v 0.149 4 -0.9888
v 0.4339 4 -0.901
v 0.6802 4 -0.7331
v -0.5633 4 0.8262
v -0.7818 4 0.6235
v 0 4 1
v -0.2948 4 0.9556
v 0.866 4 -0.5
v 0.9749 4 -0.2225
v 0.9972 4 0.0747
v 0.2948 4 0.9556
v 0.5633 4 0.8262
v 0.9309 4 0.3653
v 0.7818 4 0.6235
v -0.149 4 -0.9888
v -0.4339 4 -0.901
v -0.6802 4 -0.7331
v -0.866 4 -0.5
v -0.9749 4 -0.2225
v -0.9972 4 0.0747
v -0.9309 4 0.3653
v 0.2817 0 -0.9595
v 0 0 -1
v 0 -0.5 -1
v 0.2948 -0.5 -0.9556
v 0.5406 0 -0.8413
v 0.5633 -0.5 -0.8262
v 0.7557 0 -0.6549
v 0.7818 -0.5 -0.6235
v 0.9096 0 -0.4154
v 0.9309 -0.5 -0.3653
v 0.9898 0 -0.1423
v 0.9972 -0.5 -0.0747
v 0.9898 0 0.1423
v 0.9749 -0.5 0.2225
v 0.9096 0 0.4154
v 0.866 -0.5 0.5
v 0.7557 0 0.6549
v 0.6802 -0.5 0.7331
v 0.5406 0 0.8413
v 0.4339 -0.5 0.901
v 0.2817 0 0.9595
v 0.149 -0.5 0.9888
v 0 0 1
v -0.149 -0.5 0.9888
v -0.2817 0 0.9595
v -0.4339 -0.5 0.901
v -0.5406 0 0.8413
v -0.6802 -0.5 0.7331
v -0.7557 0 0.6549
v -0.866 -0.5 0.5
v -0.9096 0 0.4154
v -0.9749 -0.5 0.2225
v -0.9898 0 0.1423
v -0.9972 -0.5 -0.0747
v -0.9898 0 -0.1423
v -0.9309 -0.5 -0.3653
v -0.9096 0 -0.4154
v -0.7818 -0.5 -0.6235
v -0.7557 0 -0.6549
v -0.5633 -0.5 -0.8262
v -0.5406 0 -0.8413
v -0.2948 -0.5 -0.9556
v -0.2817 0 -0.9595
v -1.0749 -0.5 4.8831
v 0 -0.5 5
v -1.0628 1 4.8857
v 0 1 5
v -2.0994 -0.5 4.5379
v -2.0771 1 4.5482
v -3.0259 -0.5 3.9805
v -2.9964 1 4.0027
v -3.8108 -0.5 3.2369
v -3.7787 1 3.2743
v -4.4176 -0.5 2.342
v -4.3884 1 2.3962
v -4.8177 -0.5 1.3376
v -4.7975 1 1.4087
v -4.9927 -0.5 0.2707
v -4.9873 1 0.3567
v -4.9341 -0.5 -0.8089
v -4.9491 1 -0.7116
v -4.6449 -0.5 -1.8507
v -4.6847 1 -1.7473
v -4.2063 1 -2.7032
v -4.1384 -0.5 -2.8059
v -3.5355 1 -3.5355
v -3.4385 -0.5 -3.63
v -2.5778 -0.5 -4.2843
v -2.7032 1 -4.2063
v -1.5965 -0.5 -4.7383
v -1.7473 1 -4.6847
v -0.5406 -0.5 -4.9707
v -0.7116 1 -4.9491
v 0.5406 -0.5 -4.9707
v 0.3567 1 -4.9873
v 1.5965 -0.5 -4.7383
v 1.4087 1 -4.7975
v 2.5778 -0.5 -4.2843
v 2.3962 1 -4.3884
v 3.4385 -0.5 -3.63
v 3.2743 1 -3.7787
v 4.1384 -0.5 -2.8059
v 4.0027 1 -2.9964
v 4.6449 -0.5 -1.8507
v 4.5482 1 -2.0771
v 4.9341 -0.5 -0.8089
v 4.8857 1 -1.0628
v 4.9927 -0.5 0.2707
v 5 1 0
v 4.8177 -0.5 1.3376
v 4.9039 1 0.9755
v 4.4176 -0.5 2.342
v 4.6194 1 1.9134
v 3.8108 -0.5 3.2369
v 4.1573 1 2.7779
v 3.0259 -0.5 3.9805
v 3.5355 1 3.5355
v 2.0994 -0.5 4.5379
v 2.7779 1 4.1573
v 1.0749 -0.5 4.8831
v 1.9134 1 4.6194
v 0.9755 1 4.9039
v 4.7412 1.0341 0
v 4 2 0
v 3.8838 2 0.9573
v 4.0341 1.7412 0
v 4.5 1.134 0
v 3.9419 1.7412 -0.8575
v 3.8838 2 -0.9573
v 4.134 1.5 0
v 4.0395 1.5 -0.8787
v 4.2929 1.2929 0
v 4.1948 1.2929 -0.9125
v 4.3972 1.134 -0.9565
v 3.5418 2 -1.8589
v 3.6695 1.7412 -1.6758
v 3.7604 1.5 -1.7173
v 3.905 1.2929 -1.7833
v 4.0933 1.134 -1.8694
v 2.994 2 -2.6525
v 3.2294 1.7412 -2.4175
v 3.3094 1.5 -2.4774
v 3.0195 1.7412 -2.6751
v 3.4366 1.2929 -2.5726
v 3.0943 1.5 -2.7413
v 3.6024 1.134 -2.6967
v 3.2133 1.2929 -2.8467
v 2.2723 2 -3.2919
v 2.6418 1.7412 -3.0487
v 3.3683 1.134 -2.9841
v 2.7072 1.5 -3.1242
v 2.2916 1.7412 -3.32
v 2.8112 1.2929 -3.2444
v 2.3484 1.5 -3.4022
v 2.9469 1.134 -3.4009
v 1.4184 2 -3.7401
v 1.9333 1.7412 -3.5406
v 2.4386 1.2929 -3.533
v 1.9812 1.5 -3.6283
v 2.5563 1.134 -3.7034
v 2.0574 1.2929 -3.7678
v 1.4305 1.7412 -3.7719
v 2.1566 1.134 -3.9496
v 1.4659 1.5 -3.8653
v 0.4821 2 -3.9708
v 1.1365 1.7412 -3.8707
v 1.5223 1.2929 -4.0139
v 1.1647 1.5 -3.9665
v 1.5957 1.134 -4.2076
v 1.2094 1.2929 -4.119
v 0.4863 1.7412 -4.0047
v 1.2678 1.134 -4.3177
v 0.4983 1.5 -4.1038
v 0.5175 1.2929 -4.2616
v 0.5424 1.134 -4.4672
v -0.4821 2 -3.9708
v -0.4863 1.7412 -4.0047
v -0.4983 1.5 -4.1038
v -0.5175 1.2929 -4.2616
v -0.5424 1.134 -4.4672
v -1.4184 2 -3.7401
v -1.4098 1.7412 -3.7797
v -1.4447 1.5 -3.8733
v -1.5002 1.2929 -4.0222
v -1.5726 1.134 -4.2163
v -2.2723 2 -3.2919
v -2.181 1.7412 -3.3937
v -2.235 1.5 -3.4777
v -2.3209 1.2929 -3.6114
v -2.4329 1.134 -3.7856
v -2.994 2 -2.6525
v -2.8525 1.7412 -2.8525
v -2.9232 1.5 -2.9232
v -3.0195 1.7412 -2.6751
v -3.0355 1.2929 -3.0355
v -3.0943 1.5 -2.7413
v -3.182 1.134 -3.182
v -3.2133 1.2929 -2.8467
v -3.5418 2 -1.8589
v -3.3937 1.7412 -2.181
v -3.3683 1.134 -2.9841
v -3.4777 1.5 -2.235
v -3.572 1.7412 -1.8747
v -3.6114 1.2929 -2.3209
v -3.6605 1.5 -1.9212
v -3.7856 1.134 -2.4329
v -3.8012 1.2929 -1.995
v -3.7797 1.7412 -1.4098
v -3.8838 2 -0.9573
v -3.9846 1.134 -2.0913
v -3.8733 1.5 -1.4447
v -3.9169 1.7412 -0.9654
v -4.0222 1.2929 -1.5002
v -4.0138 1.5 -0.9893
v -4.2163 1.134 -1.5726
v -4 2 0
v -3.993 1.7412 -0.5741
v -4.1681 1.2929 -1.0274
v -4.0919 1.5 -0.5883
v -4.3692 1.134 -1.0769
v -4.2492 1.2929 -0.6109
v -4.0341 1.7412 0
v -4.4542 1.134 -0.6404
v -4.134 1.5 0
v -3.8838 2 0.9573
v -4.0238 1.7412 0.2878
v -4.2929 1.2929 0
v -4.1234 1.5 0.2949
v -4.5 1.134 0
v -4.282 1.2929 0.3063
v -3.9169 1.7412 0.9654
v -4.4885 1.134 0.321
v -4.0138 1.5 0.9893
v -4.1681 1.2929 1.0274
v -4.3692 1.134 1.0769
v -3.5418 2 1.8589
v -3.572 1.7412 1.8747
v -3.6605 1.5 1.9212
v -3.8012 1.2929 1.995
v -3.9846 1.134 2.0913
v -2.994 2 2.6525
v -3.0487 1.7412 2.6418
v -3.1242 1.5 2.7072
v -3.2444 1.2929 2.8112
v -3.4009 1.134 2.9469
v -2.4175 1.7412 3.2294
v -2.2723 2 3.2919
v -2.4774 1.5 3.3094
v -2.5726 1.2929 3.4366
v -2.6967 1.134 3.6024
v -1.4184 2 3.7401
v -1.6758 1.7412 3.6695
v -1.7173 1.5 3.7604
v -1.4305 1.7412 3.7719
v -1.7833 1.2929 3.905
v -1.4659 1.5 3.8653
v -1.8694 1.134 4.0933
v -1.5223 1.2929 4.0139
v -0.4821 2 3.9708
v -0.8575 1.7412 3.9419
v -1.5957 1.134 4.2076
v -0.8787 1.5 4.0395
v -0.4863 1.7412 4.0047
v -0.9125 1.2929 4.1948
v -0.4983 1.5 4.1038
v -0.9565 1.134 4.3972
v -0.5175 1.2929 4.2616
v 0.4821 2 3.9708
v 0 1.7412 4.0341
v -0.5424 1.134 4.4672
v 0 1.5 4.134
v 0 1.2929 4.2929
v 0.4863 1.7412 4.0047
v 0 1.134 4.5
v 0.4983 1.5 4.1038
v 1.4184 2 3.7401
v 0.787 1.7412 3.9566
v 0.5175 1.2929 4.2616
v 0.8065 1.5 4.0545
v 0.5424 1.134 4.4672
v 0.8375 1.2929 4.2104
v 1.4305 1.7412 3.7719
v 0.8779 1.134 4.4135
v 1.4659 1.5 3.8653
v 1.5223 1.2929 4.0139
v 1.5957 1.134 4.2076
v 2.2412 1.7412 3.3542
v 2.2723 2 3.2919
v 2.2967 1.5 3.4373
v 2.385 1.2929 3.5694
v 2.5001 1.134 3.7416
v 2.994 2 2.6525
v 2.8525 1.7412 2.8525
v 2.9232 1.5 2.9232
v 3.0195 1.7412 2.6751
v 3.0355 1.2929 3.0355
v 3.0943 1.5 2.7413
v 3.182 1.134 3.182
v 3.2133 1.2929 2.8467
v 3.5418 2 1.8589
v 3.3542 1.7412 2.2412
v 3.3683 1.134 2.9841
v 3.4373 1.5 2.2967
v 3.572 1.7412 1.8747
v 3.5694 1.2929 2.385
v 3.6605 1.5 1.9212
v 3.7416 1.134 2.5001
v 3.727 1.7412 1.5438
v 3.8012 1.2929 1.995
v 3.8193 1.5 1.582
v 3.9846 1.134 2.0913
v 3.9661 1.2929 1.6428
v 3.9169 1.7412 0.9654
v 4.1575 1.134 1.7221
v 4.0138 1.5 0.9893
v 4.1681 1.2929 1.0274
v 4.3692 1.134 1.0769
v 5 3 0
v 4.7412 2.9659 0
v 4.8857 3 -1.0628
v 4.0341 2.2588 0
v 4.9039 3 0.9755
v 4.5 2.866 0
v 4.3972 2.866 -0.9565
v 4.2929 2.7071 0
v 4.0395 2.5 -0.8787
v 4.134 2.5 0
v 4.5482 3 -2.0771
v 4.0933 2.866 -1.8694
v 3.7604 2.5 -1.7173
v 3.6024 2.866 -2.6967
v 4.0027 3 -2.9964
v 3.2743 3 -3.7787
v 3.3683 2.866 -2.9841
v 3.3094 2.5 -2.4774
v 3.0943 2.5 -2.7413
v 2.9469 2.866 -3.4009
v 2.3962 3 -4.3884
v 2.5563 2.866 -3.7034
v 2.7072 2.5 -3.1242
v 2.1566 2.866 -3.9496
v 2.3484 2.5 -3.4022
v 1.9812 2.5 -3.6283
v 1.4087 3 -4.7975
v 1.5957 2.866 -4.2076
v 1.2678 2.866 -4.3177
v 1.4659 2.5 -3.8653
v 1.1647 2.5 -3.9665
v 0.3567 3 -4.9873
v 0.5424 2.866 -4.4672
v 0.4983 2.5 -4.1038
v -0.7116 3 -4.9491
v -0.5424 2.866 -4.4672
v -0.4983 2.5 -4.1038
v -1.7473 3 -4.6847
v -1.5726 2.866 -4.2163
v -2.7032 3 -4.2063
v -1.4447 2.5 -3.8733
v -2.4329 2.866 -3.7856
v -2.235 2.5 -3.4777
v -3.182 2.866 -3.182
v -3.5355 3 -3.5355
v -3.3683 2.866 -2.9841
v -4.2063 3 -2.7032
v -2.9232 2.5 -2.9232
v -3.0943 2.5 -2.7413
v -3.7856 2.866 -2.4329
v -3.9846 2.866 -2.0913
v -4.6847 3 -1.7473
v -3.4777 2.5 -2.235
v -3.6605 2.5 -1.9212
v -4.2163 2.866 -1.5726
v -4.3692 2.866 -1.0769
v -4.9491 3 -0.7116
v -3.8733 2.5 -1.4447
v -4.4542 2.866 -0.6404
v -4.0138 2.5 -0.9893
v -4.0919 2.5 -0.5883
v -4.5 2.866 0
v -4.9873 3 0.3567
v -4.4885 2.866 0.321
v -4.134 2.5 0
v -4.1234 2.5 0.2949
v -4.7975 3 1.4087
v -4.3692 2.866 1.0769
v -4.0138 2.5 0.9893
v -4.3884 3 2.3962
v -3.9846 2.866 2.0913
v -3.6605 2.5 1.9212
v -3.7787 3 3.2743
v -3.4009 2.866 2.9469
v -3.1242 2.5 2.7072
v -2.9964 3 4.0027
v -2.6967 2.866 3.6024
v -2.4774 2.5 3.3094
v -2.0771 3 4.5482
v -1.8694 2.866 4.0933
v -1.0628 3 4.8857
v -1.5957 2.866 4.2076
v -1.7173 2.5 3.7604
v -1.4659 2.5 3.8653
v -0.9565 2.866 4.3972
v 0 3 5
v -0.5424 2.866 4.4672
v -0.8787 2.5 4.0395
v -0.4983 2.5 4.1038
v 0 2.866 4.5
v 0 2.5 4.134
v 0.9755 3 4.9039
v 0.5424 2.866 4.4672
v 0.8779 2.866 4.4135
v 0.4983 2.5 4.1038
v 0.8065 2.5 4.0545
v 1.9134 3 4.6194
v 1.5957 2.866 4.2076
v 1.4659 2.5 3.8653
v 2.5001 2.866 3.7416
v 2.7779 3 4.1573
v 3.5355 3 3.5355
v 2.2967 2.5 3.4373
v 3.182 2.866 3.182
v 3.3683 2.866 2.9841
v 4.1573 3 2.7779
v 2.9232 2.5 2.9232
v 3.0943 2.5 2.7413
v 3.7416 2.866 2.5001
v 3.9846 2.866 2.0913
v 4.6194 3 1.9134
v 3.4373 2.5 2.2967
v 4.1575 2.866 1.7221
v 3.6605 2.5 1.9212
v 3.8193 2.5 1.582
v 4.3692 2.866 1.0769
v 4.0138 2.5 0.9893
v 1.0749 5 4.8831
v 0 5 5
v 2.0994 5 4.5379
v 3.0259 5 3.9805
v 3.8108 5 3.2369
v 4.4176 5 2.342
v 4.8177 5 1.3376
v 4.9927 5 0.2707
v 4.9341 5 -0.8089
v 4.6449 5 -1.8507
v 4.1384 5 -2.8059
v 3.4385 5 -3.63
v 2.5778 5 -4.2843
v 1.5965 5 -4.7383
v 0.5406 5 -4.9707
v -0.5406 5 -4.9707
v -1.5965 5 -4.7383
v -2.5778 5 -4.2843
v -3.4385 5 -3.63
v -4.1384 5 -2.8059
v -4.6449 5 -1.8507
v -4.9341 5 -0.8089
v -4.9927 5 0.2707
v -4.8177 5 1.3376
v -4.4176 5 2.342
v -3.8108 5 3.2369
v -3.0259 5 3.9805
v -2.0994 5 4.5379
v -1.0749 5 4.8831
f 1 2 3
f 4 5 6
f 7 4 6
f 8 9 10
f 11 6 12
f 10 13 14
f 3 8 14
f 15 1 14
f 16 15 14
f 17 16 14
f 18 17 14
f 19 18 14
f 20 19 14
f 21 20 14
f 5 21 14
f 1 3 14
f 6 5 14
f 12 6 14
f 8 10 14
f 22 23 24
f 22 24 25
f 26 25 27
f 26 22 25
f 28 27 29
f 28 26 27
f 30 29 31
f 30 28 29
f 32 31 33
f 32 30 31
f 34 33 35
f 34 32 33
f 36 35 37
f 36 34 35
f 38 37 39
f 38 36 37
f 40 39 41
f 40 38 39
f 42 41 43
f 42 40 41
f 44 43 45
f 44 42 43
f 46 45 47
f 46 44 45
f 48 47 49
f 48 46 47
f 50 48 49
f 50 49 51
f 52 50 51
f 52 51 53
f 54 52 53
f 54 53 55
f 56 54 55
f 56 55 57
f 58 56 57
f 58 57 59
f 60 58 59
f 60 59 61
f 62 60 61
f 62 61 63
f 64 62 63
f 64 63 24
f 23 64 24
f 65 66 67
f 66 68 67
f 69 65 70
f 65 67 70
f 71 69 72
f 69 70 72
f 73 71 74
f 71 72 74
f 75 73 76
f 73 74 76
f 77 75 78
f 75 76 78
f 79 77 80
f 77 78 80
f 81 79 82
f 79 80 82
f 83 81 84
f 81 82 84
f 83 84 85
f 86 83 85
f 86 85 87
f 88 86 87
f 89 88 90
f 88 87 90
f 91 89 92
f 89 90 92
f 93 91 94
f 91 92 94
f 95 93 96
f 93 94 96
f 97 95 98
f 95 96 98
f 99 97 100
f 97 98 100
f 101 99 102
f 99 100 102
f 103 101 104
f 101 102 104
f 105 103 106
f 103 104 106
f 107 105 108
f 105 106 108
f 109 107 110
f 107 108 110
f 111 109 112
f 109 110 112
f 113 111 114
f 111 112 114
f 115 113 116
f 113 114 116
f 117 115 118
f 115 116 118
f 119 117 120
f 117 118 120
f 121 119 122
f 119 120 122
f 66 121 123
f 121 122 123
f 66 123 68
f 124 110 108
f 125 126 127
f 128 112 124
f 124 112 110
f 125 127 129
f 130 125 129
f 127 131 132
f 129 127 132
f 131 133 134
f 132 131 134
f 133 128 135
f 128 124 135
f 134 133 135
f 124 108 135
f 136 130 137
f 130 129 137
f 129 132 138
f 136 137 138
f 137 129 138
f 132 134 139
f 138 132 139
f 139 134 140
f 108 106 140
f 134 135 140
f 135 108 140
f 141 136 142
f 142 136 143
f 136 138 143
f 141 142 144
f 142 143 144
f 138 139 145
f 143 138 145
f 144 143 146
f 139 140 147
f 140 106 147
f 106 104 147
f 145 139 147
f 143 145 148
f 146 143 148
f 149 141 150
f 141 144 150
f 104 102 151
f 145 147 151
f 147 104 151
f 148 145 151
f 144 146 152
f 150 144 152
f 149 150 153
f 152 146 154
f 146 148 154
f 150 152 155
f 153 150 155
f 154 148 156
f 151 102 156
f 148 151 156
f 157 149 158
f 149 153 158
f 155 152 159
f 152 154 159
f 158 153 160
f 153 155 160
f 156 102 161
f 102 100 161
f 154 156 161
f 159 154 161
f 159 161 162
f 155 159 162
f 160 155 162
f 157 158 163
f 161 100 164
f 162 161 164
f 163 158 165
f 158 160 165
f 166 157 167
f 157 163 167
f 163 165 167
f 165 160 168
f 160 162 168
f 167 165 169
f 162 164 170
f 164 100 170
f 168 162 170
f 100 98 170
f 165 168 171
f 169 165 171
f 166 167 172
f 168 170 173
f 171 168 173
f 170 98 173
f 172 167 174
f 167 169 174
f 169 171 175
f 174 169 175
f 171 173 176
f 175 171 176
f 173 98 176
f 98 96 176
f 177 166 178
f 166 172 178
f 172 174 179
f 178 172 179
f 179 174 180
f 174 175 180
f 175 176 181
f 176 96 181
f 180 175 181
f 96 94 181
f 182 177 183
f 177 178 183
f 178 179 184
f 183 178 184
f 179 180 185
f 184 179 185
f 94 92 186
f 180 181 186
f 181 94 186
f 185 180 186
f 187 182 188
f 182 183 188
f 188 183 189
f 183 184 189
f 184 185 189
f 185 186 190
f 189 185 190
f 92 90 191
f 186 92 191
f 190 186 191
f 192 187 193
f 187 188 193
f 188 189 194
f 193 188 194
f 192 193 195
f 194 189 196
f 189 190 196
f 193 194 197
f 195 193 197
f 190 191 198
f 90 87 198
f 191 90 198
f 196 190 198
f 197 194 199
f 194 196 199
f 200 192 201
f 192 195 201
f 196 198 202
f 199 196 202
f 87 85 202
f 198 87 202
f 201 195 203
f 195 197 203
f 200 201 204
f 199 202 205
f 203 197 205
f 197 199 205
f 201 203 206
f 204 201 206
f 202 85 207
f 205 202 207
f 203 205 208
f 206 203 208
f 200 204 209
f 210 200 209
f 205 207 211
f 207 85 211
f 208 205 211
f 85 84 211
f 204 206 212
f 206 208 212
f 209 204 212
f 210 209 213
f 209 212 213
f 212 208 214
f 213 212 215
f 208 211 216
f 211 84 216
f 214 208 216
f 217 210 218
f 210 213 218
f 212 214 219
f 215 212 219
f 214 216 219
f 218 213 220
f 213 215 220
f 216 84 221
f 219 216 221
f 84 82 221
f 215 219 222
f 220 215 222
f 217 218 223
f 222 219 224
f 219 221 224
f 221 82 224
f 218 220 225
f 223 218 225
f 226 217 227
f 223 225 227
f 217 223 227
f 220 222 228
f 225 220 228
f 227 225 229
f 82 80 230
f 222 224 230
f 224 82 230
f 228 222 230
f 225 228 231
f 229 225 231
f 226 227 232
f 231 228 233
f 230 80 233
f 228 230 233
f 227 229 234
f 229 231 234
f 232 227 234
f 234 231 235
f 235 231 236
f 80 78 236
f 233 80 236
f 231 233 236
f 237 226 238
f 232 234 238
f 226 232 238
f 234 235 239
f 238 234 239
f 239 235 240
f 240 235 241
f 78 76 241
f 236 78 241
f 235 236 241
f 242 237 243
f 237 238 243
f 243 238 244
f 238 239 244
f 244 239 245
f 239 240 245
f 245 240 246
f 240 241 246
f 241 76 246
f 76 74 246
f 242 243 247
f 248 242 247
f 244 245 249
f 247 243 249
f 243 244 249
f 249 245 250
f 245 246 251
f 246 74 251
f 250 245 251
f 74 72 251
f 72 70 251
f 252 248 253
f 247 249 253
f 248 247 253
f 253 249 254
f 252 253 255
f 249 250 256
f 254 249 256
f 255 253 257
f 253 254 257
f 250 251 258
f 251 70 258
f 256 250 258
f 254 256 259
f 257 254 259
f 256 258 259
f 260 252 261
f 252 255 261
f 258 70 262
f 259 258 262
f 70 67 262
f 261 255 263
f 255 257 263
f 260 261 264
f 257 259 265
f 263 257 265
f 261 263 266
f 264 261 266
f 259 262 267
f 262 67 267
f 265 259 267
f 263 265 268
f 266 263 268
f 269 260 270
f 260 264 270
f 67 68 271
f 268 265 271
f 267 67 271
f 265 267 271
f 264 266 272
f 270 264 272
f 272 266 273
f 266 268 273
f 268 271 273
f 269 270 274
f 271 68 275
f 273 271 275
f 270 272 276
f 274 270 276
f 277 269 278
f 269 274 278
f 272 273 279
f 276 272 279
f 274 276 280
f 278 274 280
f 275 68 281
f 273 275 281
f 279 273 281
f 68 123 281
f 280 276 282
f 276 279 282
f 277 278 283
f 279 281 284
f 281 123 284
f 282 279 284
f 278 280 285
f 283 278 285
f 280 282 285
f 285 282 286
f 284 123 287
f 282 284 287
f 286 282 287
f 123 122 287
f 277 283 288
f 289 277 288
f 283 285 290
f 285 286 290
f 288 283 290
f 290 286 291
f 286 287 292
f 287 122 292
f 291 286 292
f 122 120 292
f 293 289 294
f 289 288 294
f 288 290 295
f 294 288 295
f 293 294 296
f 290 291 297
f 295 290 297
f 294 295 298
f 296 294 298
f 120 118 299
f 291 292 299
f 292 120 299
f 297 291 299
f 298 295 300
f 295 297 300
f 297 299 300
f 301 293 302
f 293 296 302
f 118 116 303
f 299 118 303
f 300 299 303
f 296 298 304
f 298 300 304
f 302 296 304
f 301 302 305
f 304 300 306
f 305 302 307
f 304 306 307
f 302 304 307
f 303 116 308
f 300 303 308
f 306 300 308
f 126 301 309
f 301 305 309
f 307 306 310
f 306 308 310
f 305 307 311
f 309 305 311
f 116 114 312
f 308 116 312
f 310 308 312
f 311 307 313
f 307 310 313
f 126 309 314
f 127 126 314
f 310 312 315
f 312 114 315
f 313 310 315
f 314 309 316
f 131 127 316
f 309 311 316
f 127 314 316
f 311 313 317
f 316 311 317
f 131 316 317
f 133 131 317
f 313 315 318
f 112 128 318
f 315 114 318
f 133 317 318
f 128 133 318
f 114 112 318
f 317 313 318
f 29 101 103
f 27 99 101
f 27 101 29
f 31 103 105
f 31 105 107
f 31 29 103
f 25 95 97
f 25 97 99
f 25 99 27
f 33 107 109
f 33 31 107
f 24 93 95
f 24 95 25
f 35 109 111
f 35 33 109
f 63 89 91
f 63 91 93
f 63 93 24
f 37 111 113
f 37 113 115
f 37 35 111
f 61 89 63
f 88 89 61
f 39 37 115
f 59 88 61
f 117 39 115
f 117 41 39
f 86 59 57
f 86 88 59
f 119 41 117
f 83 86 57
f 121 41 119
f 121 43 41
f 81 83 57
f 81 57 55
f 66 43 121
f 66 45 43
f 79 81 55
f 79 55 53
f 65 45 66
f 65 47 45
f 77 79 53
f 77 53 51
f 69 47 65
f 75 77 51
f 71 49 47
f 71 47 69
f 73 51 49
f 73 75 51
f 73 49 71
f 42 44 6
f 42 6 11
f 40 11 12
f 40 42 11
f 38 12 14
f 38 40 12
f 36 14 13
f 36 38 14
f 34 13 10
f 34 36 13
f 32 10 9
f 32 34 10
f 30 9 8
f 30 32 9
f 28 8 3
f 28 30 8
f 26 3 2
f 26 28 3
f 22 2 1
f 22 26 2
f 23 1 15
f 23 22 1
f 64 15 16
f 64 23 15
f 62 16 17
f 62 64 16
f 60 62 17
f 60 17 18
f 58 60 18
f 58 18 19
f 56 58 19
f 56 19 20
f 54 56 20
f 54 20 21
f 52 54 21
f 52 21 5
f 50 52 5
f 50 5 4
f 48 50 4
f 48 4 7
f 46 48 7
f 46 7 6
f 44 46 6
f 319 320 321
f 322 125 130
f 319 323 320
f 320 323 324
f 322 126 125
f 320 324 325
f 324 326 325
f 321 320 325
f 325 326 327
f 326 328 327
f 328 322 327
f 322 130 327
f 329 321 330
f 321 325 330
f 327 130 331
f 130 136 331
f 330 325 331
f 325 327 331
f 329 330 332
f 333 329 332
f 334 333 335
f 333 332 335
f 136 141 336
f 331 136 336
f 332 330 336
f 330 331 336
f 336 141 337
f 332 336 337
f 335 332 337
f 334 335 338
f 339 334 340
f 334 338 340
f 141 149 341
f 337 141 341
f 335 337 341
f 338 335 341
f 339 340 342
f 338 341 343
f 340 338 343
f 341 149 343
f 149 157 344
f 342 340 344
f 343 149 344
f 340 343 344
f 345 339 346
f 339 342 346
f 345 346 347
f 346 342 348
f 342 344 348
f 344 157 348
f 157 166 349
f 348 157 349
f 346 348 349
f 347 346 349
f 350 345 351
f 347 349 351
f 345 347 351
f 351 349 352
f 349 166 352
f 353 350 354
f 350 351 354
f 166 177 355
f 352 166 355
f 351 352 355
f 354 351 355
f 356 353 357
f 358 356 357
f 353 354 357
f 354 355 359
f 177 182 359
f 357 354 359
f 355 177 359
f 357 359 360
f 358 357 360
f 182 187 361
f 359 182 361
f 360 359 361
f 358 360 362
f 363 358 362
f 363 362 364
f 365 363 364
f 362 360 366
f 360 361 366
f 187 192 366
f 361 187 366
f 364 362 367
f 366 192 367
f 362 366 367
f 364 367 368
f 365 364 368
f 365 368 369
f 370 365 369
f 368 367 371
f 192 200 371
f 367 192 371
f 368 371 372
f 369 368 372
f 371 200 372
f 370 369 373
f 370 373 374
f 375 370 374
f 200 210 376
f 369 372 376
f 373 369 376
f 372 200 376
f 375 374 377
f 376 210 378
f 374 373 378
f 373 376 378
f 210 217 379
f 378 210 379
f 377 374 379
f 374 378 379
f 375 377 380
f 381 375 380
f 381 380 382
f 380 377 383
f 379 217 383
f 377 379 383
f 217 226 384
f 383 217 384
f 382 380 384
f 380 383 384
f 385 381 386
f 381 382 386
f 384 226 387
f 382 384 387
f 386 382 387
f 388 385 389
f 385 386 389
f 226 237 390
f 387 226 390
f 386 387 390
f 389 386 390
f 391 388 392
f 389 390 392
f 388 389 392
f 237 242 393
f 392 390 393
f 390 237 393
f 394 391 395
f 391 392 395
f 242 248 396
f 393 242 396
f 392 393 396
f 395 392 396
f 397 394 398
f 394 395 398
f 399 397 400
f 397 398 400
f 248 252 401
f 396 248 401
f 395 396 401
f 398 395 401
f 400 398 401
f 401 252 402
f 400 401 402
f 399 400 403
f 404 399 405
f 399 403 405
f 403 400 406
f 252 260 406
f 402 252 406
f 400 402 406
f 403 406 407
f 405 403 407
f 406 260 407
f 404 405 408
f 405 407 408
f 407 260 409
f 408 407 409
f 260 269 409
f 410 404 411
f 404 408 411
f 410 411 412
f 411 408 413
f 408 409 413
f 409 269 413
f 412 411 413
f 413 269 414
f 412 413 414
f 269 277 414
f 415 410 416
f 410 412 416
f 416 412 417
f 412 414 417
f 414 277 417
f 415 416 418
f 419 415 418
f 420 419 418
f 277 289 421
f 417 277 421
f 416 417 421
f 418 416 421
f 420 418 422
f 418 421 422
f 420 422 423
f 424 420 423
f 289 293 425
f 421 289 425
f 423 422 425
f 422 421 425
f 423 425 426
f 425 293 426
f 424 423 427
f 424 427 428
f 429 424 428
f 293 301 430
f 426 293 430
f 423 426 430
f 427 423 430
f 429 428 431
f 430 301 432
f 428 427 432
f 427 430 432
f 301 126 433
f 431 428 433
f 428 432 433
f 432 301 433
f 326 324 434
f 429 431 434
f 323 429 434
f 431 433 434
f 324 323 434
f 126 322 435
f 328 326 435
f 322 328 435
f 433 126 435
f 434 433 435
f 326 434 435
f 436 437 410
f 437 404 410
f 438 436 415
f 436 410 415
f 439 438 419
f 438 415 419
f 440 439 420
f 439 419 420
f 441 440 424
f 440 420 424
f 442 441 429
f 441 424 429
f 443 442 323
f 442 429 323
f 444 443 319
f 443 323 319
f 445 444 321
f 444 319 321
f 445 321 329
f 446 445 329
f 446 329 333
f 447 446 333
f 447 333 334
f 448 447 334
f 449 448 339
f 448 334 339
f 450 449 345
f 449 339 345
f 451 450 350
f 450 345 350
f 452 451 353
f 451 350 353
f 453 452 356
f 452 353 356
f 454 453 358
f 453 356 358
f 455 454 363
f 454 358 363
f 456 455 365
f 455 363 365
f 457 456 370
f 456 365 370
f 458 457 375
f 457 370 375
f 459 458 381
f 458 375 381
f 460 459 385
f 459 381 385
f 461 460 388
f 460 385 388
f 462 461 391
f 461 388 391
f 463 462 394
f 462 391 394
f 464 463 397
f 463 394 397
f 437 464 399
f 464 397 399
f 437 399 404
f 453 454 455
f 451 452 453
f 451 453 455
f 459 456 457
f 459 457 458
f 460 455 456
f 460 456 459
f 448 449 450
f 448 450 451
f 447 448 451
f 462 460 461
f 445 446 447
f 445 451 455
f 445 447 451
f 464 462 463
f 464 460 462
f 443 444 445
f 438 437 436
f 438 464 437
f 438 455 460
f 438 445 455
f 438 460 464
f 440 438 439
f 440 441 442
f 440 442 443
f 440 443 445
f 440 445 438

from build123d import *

# Parameters (mm, degrees)
SKETCH1_R            = 5
SKETCH1_R_2          = 1
BOSS_EXTRUDE1_DEPTH  = 4
CUT_SWEEP1_PROFILE_R = 1
SKETCH13_R           = 5
BOSS_EXTRUDE2_DEPTH  = 1
SKETCH14_R           = 5
SKETCH14_R_2         = 1
BOSS_EXTRUDE3_DEPTH  = 0.5


with BuildPart() as part:
    # Sketch1 → Boss-Extrude1 (new body)
    with BuildSketch(Plane(origin=(0, 0, 0), x_dir=(1, 0, 0), z_dir=(0, 1, 0))):
        with Locations(Location((0, 0, 0), (0, 0, 270))):
            Circle(SKETCH1_R)
        with Locations(Location((0, 0, 0), (0, 0, 270))):
            Circle(SKETCH1_R_2, mode=Mode.SUBTRACT)
    extrude(amount=BOSS_EXTRUDE1_DEPTH)

    # Cut-Sweep1: sweep along a path in Sketch2
    with BuildLine(Plane(origin=(0, 2, 0), x_dir=(1, 0, 0), z_dir=(0, 1, 0))) as cut_sweep1_path:
        CenterArc((0, 0), 5, 0, 360)
    # Cut-Sweep1 profile (on start of the path) → Cut-Sweep1 (sweep, cut)
    with BuildSketch(Plane(origin=(5, 2, 0), x_dir=(-1, 0, 0), z_dir=(0, 0, -1))):
        Circle(CUT_SWEEP1_PROFILE_R)
    sweep(path=cut_sweep1_path.line, mode=Mode.SUBTRACT)

    # Sketch13 → Boss-Extrude2 (add)
    with BuildSketch(Plane(origin=(0, 4, 0), x_dir=(1, 0, 0), z_dir=(0, 1, 0))):
        with Locations(Location((0, 0, 0), (0, 0, 270))):
            Circle(SKETCH13_R)
    extrude(amount=BOSS_EXTRUDE2_DEPTH)

    # Sketch14 → Boss-Extrude3 (add)
    with BuildSketch(Plane.XZ):
        with Locations(Location((0, 0, 0), (0, 0, 90))):
            Circle(SKETCH14_R)
        with Locations(Location((0, 0, 0), (0, 0, 270))):
            Circle(SKETCH14_R_2, mode=Mode.SUBTRACT)
    extrude(amount=BOSS_EXTRUDE3_DEPTH)


solid = part.part
